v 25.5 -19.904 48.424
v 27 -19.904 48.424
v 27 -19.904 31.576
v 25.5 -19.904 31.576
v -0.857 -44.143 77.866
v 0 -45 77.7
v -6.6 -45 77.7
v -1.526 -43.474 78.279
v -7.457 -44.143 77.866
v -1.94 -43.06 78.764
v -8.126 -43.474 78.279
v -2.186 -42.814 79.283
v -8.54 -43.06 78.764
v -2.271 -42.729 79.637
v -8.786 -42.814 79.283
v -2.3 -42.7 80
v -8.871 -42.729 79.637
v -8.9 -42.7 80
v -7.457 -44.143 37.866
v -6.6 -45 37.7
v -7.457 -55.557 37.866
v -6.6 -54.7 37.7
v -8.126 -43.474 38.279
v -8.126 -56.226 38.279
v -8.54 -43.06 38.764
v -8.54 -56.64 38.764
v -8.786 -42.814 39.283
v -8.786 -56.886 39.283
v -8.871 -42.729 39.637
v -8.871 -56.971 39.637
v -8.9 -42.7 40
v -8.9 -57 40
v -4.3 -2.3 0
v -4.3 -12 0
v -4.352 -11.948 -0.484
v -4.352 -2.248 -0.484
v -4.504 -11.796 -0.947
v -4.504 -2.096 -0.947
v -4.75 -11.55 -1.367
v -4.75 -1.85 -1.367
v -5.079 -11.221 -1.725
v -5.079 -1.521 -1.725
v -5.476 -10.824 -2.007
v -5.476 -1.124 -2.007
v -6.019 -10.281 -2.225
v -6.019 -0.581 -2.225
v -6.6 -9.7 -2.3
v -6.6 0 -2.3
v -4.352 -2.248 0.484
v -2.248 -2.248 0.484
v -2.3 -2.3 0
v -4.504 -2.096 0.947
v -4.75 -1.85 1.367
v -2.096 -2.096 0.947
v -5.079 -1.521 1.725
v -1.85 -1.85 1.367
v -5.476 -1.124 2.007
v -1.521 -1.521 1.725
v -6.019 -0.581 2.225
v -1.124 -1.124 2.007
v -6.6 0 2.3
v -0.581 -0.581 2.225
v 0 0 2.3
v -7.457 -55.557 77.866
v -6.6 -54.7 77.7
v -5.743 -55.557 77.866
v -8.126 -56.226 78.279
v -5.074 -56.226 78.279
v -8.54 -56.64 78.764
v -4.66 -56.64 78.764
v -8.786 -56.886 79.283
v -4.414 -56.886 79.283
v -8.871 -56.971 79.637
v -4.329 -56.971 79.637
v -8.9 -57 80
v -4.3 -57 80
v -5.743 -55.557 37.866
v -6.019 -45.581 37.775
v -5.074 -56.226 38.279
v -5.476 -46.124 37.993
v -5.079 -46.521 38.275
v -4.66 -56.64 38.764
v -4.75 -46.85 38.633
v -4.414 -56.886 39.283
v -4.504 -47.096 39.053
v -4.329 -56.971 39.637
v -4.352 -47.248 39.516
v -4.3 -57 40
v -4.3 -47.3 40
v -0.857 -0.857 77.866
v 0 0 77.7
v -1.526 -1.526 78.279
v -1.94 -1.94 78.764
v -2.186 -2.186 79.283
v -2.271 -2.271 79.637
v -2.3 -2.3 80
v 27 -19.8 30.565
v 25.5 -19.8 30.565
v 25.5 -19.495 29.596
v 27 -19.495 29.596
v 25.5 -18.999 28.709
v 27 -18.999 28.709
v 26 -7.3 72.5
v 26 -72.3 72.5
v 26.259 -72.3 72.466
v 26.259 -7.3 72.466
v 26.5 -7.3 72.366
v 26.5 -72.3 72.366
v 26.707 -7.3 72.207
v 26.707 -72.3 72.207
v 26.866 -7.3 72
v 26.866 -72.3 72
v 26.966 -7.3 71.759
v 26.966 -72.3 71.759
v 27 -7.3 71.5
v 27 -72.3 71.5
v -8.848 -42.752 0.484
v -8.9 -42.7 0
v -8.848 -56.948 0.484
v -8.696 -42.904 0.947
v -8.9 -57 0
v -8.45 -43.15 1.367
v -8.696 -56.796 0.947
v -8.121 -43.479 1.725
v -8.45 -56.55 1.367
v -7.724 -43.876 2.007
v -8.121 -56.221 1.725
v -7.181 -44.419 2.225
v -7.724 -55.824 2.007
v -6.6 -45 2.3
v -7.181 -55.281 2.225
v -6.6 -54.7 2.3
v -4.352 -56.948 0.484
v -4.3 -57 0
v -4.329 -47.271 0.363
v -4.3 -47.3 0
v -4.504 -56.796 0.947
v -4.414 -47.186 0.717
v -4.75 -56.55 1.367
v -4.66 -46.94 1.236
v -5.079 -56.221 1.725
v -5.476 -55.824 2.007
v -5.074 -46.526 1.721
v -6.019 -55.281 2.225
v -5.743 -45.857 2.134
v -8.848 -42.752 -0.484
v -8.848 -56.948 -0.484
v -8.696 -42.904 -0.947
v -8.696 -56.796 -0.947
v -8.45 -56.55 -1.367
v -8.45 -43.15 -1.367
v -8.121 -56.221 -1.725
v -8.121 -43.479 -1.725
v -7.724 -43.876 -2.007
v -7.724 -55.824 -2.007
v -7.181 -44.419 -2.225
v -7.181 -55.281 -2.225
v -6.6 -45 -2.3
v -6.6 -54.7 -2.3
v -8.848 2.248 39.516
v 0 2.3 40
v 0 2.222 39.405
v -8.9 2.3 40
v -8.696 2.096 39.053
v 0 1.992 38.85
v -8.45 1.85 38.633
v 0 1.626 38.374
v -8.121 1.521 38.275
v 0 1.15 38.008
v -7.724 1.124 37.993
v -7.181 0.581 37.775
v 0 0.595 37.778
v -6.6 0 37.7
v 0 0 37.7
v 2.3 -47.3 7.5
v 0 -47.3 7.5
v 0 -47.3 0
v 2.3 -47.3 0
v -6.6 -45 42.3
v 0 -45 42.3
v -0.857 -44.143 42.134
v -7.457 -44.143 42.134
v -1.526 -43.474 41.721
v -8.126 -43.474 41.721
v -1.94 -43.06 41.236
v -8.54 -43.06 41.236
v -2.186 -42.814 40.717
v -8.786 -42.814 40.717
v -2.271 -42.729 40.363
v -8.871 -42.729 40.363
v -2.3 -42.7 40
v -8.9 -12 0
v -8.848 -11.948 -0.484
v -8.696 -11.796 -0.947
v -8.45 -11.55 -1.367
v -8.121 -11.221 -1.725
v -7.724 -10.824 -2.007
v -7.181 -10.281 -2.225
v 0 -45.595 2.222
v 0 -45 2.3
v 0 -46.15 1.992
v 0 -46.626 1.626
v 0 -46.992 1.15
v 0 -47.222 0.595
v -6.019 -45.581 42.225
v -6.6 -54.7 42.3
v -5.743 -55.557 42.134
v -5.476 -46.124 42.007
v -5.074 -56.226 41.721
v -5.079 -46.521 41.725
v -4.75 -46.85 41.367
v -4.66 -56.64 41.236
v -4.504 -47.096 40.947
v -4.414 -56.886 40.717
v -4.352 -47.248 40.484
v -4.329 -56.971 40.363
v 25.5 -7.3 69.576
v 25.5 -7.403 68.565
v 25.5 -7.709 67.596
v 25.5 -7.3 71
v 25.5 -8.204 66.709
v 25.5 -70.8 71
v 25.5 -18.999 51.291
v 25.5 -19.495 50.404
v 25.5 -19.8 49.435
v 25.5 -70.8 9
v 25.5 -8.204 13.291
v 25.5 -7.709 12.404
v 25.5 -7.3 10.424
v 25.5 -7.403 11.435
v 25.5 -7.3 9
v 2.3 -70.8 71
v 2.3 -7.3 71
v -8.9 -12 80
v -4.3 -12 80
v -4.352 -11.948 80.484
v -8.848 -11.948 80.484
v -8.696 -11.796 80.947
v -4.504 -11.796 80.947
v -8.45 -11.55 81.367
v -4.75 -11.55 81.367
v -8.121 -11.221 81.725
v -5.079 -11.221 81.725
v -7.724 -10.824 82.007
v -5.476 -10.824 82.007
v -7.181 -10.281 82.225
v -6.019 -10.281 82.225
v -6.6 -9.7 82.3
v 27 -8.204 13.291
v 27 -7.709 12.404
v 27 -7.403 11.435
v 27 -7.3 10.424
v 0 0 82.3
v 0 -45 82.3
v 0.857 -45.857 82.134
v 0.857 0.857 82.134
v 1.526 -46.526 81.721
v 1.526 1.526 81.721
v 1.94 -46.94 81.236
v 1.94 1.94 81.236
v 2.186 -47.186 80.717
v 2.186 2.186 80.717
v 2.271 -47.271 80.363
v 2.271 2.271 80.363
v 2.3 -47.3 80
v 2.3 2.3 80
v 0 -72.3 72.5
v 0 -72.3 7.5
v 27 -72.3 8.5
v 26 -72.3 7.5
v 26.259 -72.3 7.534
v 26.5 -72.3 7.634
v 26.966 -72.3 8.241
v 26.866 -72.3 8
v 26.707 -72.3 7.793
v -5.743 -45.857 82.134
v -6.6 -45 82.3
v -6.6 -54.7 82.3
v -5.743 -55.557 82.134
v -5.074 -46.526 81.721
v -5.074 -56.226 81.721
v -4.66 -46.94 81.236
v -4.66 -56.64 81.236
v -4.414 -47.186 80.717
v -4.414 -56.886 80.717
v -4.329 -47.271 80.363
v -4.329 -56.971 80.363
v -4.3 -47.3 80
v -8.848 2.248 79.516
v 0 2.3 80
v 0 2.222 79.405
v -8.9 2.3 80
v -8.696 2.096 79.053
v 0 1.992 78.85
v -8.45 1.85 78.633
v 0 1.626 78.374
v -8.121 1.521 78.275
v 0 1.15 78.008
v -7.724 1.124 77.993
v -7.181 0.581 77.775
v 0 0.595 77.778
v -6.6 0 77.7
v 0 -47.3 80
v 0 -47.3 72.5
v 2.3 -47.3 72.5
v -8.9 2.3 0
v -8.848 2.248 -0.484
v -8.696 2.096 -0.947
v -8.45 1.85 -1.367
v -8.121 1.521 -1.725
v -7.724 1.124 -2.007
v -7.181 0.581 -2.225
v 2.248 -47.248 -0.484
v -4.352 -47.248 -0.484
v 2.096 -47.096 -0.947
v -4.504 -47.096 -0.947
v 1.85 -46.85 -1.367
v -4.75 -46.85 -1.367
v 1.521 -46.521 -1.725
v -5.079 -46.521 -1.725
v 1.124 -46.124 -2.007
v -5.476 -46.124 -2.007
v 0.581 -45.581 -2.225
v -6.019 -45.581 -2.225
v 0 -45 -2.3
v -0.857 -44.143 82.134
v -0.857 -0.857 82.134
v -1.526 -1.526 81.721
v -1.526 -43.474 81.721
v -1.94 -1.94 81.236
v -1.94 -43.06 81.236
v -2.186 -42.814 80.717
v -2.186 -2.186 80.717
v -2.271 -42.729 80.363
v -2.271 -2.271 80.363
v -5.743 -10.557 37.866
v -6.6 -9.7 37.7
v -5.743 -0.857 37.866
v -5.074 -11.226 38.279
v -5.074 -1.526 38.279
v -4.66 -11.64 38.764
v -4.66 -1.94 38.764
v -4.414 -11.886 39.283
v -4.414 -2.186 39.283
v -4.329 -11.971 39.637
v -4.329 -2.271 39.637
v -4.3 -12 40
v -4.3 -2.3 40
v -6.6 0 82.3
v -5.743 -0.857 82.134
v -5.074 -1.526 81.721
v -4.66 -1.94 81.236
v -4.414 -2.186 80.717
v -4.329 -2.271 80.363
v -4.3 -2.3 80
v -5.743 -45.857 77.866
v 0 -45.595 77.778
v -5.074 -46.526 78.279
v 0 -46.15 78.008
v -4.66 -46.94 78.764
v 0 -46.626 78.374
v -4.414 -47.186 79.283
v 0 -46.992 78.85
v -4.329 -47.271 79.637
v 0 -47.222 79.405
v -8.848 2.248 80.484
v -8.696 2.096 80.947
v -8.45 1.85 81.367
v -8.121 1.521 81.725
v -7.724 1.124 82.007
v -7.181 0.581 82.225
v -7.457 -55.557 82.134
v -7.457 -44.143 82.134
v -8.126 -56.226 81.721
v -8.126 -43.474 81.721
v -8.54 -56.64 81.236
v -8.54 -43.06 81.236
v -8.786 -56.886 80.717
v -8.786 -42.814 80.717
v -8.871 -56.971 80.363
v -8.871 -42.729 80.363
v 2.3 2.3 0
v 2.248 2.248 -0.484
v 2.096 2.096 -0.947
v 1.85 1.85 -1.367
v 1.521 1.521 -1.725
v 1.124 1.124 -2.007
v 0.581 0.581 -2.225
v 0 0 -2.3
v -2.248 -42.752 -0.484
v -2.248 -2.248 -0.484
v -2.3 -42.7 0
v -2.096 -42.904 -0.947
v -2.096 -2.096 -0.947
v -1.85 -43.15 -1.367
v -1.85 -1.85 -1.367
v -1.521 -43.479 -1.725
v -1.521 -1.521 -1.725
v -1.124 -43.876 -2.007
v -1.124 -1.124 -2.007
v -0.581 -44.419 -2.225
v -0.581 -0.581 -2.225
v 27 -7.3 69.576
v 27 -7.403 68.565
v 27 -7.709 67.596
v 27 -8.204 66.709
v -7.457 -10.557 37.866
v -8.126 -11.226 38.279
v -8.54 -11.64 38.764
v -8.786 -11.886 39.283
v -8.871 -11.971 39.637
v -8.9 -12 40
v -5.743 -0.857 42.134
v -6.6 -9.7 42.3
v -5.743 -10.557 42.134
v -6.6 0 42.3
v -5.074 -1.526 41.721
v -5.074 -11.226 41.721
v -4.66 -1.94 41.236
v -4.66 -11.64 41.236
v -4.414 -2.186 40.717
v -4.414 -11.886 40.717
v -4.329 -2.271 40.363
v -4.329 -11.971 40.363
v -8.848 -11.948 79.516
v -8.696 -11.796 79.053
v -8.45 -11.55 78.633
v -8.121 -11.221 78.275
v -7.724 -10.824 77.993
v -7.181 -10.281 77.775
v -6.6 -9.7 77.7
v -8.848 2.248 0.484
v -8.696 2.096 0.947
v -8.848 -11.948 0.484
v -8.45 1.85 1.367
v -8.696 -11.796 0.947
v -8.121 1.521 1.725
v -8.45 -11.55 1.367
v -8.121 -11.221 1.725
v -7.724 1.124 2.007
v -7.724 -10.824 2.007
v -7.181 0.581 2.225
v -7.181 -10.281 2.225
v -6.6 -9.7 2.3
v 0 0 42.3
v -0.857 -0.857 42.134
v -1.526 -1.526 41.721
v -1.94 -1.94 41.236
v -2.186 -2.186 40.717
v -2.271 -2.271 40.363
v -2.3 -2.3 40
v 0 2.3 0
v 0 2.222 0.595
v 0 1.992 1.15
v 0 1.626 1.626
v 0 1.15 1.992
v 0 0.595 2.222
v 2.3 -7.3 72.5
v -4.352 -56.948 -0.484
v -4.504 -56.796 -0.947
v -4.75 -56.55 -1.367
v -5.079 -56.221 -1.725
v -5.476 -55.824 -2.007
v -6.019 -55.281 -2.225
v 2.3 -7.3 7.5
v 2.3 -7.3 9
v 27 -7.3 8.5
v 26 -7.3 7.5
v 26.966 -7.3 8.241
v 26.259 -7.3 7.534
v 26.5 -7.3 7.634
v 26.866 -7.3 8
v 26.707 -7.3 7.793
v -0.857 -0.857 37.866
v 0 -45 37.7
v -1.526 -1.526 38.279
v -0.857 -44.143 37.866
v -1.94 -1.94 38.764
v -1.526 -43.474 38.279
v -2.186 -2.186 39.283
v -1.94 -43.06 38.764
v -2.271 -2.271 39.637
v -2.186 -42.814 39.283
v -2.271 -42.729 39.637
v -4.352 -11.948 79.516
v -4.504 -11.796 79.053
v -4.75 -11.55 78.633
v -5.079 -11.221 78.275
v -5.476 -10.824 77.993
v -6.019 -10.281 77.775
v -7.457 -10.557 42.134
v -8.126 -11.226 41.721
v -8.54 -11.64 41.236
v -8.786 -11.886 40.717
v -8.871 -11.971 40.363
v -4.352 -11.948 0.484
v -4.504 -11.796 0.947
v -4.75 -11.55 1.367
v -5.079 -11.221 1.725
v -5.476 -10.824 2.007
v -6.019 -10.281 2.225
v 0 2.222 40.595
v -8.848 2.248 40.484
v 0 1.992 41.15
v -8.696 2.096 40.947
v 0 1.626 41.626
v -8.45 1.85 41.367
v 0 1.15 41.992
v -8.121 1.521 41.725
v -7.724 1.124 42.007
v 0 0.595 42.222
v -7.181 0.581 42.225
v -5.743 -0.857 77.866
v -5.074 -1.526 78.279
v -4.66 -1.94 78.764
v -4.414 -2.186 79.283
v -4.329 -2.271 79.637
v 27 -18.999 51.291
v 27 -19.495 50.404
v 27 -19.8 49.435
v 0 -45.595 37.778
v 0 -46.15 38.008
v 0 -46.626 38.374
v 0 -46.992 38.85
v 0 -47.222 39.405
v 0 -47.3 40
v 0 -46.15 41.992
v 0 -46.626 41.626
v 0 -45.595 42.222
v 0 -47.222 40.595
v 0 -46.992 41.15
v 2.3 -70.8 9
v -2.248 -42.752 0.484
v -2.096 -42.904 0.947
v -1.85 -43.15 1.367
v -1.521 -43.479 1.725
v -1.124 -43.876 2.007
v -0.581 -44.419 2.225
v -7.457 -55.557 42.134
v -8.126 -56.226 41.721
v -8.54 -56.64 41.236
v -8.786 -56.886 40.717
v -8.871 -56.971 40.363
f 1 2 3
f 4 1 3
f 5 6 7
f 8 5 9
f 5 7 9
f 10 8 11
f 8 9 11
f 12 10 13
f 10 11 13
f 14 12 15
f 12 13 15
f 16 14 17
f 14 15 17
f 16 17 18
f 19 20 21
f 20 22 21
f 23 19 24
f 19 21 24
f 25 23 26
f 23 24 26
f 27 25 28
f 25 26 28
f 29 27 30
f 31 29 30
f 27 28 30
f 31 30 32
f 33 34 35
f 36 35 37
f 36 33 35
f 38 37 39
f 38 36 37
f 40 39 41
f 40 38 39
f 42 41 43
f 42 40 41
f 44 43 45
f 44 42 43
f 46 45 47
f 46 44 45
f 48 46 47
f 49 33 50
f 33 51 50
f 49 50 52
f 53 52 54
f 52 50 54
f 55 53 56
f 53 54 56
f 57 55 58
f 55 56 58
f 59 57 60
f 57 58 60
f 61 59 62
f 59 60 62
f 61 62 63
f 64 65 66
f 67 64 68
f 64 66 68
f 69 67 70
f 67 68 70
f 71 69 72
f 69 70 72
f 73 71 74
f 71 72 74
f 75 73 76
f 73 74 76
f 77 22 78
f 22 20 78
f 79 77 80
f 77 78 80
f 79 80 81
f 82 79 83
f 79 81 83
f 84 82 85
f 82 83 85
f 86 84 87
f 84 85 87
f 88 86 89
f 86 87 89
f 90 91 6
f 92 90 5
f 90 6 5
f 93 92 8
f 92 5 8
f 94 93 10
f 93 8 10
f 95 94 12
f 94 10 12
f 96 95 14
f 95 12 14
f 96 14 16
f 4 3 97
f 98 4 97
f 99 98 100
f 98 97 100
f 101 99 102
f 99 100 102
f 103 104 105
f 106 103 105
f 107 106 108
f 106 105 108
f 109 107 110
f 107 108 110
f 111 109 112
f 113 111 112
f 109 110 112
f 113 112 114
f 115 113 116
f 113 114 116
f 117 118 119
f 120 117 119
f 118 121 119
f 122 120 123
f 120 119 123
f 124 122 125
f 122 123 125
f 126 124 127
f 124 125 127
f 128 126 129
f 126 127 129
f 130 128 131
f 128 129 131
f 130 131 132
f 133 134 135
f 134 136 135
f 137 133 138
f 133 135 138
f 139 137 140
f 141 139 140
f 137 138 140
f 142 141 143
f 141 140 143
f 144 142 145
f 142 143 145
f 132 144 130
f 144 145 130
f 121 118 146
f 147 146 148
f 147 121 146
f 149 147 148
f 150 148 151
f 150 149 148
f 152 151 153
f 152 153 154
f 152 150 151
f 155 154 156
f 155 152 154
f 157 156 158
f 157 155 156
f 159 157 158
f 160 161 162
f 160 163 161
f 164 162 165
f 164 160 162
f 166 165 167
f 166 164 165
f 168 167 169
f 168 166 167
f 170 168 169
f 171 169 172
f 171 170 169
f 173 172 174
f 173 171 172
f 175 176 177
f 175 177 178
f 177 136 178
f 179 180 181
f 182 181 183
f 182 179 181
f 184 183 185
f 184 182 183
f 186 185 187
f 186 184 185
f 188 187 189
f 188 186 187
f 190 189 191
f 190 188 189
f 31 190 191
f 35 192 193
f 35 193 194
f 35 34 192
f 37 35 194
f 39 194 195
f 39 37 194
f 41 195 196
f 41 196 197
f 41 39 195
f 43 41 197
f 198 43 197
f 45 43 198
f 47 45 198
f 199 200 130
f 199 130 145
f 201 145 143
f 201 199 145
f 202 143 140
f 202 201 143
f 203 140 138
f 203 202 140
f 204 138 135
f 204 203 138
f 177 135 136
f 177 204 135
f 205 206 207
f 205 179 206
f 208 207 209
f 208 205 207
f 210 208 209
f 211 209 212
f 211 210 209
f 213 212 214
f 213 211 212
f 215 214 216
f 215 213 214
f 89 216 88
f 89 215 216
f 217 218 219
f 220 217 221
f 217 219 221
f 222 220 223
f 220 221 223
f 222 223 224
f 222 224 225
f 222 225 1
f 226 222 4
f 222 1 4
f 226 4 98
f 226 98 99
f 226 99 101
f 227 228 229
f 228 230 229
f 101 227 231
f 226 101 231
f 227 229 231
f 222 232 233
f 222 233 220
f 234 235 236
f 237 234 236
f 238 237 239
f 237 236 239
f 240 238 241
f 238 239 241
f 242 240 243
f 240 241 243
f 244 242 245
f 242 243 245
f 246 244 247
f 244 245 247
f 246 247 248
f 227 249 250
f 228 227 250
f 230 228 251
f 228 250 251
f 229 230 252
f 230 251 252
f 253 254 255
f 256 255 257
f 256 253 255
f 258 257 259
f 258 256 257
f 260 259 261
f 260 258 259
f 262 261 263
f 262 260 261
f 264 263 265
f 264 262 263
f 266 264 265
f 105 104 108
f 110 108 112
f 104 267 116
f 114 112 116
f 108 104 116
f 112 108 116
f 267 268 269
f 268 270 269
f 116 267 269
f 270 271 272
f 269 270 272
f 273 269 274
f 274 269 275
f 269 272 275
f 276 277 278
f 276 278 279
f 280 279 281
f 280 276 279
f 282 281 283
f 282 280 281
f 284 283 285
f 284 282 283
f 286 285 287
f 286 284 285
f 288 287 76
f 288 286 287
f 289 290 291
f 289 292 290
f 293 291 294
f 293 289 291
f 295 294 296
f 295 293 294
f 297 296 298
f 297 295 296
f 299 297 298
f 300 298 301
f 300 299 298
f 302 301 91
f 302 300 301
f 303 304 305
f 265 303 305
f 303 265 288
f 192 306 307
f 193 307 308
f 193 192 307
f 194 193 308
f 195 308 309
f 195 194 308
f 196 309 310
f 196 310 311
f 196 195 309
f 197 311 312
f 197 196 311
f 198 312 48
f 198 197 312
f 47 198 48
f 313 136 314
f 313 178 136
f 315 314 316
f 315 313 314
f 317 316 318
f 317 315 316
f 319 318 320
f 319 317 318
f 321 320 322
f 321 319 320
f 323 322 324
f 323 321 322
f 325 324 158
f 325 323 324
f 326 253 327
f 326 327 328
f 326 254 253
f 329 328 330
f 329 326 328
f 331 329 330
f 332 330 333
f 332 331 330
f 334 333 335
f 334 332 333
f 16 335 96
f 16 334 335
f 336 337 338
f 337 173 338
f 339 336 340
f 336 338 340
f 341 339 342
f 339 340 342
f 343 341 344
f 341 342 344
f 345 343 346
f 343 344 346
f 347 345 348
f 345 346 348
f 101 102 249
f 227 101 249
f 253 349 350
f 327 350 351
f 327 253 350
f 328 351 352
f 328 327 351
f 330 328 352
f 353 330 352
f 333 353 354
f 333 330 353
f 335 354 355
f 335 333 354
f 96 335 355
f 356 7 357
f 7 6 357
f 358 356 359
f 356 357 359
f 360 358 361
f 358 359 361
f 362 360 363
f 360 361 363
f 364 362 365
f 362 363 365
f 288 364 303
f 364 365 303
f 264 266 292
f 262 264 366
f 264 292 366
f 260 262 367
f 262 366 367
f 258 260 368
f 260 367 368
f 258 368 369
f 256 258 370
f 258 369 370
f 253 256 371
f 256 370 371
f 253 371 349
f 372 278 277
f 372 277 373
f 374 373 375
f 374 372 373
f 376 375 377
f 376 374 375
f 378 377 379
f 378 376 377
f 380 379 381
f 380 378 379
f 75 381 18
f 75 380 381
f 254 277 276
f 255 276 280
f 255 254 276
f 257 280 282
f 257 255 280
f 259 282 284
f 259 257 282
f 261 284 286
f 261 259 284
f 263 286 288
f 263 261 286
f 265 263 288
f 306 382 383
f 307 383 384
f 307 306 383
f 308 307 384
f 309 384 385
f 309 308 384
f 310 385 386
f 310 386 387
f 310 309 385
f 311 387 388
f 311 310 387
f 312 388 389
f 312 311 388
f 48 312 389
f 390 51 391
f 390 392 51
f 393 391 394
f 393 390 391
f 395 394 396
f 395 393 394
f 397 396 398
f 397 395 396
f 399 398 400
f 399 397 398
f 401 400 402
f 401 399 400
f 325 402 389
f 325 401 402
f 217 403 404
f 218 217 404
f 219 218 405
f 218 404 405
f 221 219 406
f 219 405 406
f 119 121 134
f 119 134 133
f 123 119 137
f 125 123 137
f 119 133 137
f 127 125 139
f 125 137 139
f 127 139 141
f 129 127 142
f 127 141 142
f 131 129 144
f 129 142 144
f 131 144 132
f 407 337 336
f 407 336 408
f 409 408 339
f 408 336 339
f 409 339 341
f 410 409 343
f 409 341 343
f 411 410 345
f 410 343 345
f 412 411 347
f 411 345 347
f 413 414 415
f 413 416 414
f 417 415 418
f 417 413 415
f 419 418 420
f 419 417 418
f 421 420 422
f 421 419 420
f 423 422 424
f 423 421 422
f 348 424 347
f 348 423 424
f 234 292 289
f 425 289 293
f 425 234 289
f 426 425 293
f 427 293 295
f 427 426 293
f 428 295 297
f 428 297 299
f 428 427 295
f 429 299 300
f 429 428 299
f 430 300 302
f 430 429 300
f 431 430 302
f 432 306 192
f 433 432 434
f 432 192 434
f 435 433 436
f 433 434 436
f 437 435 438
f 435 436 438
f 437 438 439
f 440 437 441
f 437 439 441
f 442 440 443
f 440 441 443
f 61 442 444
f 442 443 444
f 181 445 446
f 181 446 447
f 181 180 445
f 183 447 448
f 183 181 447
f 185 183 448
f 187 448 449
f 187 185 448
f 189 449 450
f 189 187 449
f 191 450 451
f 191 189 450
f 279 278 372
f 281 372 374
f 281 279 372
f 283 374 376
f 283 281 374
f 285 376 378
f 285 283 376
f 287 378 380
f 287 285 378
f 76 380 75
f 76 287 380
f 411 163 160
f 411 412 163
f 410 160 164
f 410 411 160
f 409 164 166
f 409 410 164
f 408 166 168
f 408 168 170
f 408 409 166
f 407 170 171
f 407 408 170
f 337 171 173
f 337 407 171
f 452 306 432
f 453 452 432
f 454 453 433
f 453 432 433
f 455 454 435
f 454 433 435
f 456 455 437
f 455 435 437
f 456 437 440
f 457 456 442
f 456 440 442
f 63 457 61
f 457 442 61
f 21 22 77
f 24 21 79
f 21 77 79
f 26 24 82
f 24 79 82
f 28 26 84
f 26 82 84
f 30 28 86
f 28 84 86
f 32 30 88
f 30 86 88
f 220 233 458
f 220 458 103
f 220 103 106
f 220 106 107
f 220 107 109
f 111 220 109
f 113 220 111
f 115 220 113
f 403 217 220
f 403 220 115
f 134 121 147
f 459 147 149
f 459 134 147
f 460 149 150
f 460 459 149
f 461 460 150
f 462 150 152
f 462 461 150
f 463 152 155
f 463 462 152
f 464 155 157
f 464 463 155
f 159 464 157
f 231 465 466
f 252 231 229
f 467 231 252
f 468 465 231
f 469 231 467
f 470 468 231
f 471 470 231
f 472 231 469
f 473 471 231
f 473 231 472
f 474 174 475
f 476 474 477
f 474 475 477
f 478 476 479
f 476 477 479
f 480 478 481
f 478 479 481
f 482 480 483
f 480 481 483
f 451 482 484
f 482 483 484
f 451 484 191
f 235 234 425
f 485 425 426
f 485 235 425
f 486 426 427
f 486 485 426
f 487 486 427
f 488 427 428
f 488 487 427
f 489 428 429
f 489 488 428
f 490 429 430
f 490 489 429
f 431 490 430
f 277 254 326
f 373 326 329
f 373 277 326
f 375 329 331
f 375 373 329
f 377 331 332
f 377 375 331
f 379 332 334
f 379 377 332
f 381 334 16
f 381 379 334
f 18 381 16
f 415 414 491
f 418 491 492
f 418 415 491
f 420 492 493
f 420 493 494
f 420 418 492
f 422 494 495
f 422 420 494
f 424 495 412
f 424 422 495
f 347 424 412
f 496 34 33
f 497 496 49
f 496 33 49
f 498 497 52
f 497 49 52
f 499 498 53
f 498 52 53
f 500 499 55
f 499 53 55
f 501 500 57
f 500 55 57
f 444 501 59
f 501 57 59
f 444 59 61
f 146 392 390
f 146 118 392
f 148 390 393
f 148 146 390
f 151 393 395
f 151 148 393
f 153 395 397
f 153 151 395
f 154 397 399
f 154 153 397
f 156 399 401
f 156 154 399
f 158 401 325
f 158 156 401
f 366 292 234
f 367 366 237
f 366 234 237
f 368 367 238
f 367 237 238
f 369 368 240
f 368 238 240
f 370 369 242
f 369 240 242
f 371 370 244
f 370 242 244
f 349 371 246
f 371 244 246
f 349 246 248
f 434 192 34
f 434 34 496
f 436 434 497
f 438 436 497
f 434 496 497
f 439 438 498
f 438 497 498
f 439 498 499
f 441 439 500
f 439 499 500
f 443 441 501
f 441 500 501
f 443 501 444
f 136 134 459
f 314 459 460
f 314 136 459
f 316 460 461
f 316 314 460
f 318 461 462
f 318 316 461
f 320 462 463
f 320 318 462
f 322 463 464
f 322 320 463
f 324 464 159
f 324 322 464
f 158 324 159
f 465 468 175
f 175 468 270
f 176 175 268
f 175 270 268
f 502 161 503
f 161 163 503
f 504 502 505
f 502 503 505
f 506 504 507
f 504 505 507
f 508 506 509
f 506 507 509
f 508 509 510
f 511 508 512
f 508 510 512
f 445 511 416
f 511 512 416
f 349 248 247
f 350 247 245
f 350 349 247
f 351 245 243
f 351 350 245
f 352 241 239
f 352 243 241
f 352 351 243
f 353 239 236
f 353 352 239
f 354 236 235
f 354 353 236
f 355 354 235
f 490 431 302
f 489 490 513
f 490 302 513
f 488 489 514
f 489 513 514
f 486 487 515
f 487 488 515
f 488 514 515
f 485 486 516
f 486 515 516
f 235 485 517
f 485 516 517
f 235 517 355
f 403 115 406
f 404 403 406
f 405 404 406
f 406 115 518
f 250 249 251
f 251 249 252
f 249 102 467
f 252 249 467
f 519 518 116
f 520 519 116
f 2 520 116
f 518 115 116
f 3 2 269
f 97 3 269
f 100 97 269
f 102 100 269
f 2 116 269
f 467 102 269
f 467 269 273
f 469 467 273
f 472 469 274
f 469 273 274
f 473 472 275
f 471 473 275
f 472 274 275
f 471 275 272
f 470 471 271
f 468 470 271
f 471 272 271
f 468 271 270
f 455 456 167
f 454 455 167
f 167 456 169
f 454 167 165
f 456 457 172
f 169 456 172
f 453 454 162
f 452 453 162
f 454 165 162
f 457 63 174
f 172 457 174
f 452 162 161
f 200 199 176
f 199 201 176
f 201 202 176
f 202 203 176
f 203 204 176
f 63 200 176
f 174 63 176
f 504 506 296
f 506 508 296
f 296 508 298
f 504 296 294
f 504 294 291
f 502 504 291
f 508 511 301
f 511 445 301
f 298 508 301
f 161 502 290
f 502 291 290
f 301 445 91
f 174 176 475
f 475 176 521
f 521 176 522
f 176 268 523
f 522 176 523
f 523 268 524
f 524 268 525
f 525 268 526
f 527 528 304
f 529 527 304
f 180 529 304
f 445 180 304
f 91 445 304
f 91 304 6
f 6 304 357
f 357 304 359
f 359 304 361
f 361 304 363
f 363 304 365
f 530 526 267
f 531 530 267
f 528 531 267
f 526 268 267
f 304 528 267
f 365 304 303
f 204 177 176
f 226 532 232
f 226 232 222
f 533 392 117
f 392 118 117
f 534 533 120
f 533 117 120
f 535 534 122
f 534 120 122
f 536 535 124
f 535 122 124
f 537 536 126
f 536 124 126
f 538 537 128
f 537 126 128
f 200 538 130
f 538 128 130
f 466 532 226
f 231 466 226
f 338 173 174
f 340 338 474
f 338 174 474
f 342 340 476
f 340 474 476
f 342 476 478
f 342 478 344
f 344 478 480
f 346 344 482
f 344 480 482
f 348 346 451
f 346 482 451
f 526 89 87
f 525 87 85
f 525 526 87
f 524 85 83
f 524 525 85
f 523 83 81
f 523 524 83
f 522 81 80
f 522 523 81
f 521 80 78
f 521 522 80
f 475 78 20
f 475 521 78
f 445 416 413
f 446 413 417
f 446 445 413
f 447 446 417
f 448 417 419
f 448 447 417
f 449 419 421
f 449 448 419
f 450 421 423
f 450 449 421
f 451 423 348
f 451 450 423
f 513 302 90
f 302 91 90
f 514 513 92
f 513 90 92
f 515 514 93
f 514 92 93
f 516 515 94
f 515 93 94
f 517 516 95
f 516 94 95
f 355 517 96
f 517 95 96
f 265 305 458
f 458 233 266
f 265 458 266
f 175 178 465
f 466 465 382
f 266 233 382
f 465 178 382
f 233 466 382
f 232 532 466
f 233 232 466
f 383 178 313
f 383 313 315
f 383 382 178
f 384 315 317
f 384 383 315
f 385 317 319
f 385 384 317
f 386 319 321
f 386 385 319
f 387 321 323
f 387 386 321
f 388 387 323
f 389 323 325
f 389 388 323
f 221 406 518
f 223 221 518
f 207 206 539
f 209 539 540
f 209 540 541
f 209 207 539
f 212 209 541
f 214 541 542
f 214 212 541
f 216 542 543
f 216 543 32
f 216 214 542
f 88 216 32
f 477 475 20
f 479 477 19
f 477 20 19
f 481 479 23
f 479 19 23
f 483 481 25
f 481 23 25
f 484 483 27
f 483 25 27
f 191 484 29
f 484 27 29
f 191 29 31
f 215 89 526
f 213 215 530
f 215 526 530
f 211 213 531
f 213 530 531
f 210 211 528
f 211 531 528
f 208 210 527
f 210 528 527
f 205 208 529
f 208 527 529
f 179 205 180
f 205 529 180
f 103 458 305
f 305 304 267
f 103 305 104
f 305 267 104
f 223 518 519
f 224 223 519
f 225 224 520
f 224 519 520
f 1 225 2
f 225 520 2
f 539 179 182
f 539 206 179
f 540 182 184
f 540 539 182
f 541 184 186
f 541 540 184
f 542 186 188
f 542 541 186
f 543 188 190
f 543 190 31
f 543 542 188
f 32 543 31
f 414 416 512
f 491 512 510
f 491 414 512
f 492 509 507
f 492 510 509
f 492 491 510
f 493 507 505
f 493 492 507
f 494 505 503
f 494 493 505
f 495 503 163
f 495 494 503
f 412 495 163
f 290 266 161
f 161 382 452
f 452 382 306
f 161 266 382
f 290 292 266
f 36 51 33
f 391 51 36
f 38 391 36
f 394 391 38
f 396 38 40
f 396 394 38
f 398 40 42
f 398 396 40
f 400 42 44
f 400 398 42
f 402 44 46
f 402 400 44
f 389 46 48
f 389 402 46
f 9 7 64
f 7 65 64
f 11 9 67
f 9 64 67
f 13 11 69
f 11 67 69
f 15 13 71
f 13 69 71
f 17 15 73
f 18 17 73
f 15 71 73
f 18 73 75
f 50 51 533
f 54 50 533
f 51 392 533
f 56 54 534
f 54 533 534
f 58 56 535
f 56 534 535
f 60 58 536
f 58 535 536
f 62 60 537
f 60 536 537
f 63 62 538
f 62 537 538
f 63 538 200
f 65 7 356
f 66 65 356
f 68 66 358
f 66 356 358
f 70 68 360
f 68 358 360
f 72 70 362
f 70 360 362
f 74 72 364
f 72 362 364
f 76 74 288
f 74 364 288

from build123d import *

# Parameters (mm, degrees)
EXTRU_MINCE1_DEPTH           = 2.3
CONG_1_R                     = 2.3
ESQUISSE2_W                  = 80
ESQUISSE2_H                  = 49.6
BOSS_EXTRU_1_DEPTH           = 2.3
R_P_TITION_START             = 77.7
R_P_TITION_LIN_AIRE1_DEPTH   = 4.6
R_P_TITION_START_2           = 37.7
R_P_TITION_LIN_AIRE1_2_DEPTH = 4.6
CONG_2_R                     = 2.3
BOSS_EXTRU_2_DEPTH           = 40
BOSS_EXTRU_2_DEPTH_BACK      = 25
BOSS_EXTRU_2_START           = -47.3
ESQUISSE5_W                  = 23.2
ESQUISSE5_H                  = 62
ENL_V_MAT_EXTRU_1_DEPTH      = 63.5
ESQUISSE6_OUTSIDE_W          = 110.274
ESQUISSE6_OUTSIDE_H          = 100.274
ENL_V_MAT_EXTRU_2_DEPTH      = 1.5


# Read off the part's stored shape, not the designer's step: Répétition linéaire1
with BuildPart() as part:
    # Esquisse1 → Extru.-Mince1 (new, symmetric)
    with BuildSketch(Plane.XY):
        Polygon((-4.3, -57), (-4.3, -47.3), (2.3, -47.3), (2.3, 2.3), (-8.9, 2.3), (-8.9, -12), (-4.3, -12), (-4.3, -2.3), (-2.3, -2.3), (-2.3, -42.7), (-8.9, -42.7), (-8.9, -57), align=None)
    extrude(amount=EXTRU_MINCE1_DEPTH, both=True)

    # Congé1
    cong_1_edges = [part.edges().sort_by_distance(p)[0] for p in [
        (-6.6, -57, -2.3),
        (-4.3, -52.15, -2.3),
        (-1, -47.3, -2.3),
        (2.3, -22.5, -2.3),
        (-3.3, 2.3, -2.3),
        (-8.9, -4.85, -2.3),
        (-6.6, -12, -2.3),
        (-4.3, -7.15, -2.3),
        (-3.3, -2.3, -2.3),
        (-2.3, -22.5, -2.3),
        (-5.6, -42.7, -2.3),
        (-8.9, -49.85, -2.3),
        (-5.6, -42.7, 2.3),
        (-2.3, -22.5, 2.3),
        (-3.3, -2.3, 2.3),
        (-4.3, -7.15, 2.3),
        (-6.6, -12, 2.3),
        (-8.9, -4.85, 2.3),
        (-3.3, 2.3, 2.3),
        (2.3, -22.5, 2.3),
        (-1, -47.3, 2.3),
        (-4.3, -52.15, 2.3),
        (-6.6, -57, 2.3),
        (-8.9, -49.85, 2.3),
    ]]
    fillet(cong_1_edges, radius=CONG_1_R - 0.0001)  # a hair under: the kernel refuses the full size

    # Esquisse2 → Boss.-Extru.1 (add)
    with BuildSketch(Plane(origin=(0, 0, 0), x_dir=(0, 0, -1), z_dir=(1, 0, 0))):
        with Locations((-40, -22.5)):
            Rectangle(ESQUISSE2_W, ESQUISSE2_H)
    extrude(amount=BOSS_EXTRU_1_DEPTH)

    # Répétition linéaire1 outline → Répétition linéaire1 (add)
    with BuildSketch(Plane.XY.offset(R_P_TITION_START)):
        Polygon((-8.9, 2.3), (-8.9, -12), (-4.3, -12), (-4.3, -2.3), (-2.3, -2.3), (-2.3, -42.7), (-8.9, -42.7), (-8.9, -57), (-4.3, -57), (-4.3, -47.3), (2.3, -47.3), (2.3, 2.3), align=None)
    extrude(amount=R_P_TITION_LIN_AIRE1_DEPTH)

    # R_p_tition lin_aire1 2 outline → R_p_tition lin_aire1 2 (add)
    with BuildSketch(Plane.XY.offset(R_P_TITION_START_2)):
        Polygon((0, 2.3), (-8.9, 2.3), (-8.9, -12), (-4.3, -12), (-4.3, -2.3), (-2.3, -2.3), (-2.3, -42.7), (-8.9, -42.7), (-8.9, -57), (-4.3, -57), (-4.3, -47.3), (0, -47.3), align=None)
    extrude(amount=R_P_TITION_LIN_AIRE1_2_DEPTH)

    # Congé2
    cong_2_edges = [part.edges().sort_by_distance(p)[0] for p in [
        (2.3, -22.5, 82.3),
        (-1, -47.3, 82.3),
        (-3.3, 2.3, 82.3),
        (-4.45, 2.3, 77.7),
        (-2.15, -47.3, 77.7),
        (-4.3, -52.15, 77.7),
        (-6.6, -57, 77.7),
        (-6.6, -12, 77.7),
        (-8.9, -4.85, 77.7),
        (-8.9, -49.85, 77.7),
        (-6.6, -57, 82.3),
        (-4.3, -52.15, 82.3),
        (-8.9, -4.85, 82.3),
        (-6.6, -12, 82.3),
        (-4.3, -7.15, 77.7),
        (-3.3, -2.3, 77.7),
        (-2.3, -22.5, 77.7),
        (-5.6, -42.7, 77.7),
        (-8.9, -49.85, 82.3),
        (-4.3, -7.15, 82.3),
        (-3.3, -2.3, 82.3),
        (-2.3, -22.5, 82.3),
        (-5.6, -42.7, 82.3),
        (-2.15, -47.3, 42.3),
        (-4.45, 2.3, 42.3),
        (-4.3, -7.15, 42.3),
        (-3.3, -2.3, 42.3),
        (-2.3, -22.5, 42.3),
        (-5.6, -42.7, 42.3),
        (-8.9, -49.85, 42.3),
        (-4.45, 2.3, 37.7),
        (-2.15, -47.3, 37.7),
        (-4.3, -52.15, 37.7),
        (-6.6, -57, 37.7),
        (-6.6, -12, 37.7),
        (-8.9, -4.85, 37.7),
        (-8.9, -49.85, 37.7),
        (-6.6, -57, 42.3),
        (-4.3, -52.15, 42.3),
        (-8.9, -4.85, 42.3),
        (-6.6, -12, 42.3),
        (-4.3, -7.15, 37.7),
        (-3.3, -2.3, 37.7),
        (-2.3, -22.5, 37.7),
        (-5.6, -42.7, 37.7),
    ]]
    fillet(cong_2_edges, radius=CONG_2_R - 0.0001)  # a hair under: the kernel refuses the full size

    # Esquisse4 → Boss.-Extru.2 (add, two sides: drawn at the far end of the back side and taken through both)
    with BuildSketch(Plane(origin=(0, 0, 0), x_dir=(1, 0, 0), z_dir=(0, 1, 0)).offset(BOSS_EXTRU_2_START - BOSS_EXTRU_2_DEPTH_BACK)):
        with BuildLine():
            Line((0, -72.5), (26, -72.5))
            ThreePointArc((26, -72.5), (26.707106781, -72.207106781), (27, -71.5))
            Line((27, -71.5), (27, -8.5))
            ThreePointArc((27, -8.5), (26.707106781, -7.792893219), (26, -7.5))
            Line((26, -7.5), (0, -7.5))
            Line((0, -7.5), (0, -72.5))
        make_face()
    extrude(amount=BOSS_EXTRU_2_DEPTH + BOSS_EXTRU_2_DEPTH_BACK)

    # Esquisse5 → Enlèv. mat.-Extru.1 (cut)
    with BuildSketch(Plane(origin=(0, -7.3, 0), x_dir=(1, 0, 0), z_dir=(0, 1, 0))):
        with Locations((13.9, -40)):
            Rectangle(ESQUISSE5_W, ESQUISSE5_H)
    extrude(amount=-ENL_V_MAT_EXTRU_1_DEPTH, mode=Mode.SUBTRACT)

    # Esquisse6 outside → Enlèv. mat.-Extru.2 (cut)
    with BuildSketch(Plane(origin=(27, 0, 0), x_dir=(0, 0, -1), z_dir=(1, 0, 0))):
        with Locations((-40, -35)):
            Rectangle(ESQUISSE6_OUTSIDE_W, ESQUISSE6_OUTSIDE_H)
        with BuildLine():
            Line((-66.708611763, -8.204239779), (-51.291388237, -18.999495909))
            ThreePointArc((-51.291388237, -18.999495909), (-49.927035053, -19.672320442), (-48.423506056, -19.903735688))
            Line((-48.423506056, -19.903735688), (-31.576493944, -19.903735688))
            ThreePointArc((-31.576493944, -19.903735688), (-30.072964947, -19.672320442), (-28.708611763, -18.999495909))
            Line((-28.708611763, -18.999495909), (-13.291388237, -8.204239779))
            ThreePointArc((-13.291388237, -8.204239779), (-11.927035053, -7.531415246), (-10.423506056, -7.3))
            Line((-10.423506056, -7.3), (-7.5, -7.3))
            Line((-7.5, -7.3), (-7.5, -72.3))
            Line((-7.5, -72.3), (-72.5, -72.3))
            Line((-72.5, -72.3), (-72.5, -7.3))
            Line((-72.5, -7.3), (-69.576493944, -7.3))
            ThreePointArc((-69.576493944, -7.3), (-68.072964947, -7.531415246), (-66.708611763, -8.204239779))
        make_face(mode=Mode.SUBTRACT)
    extrude(amount=-ENL_V_MAT_EXTRU_2_DEPTH, mode=Mode.SUBTRACT)


solid = part.part
